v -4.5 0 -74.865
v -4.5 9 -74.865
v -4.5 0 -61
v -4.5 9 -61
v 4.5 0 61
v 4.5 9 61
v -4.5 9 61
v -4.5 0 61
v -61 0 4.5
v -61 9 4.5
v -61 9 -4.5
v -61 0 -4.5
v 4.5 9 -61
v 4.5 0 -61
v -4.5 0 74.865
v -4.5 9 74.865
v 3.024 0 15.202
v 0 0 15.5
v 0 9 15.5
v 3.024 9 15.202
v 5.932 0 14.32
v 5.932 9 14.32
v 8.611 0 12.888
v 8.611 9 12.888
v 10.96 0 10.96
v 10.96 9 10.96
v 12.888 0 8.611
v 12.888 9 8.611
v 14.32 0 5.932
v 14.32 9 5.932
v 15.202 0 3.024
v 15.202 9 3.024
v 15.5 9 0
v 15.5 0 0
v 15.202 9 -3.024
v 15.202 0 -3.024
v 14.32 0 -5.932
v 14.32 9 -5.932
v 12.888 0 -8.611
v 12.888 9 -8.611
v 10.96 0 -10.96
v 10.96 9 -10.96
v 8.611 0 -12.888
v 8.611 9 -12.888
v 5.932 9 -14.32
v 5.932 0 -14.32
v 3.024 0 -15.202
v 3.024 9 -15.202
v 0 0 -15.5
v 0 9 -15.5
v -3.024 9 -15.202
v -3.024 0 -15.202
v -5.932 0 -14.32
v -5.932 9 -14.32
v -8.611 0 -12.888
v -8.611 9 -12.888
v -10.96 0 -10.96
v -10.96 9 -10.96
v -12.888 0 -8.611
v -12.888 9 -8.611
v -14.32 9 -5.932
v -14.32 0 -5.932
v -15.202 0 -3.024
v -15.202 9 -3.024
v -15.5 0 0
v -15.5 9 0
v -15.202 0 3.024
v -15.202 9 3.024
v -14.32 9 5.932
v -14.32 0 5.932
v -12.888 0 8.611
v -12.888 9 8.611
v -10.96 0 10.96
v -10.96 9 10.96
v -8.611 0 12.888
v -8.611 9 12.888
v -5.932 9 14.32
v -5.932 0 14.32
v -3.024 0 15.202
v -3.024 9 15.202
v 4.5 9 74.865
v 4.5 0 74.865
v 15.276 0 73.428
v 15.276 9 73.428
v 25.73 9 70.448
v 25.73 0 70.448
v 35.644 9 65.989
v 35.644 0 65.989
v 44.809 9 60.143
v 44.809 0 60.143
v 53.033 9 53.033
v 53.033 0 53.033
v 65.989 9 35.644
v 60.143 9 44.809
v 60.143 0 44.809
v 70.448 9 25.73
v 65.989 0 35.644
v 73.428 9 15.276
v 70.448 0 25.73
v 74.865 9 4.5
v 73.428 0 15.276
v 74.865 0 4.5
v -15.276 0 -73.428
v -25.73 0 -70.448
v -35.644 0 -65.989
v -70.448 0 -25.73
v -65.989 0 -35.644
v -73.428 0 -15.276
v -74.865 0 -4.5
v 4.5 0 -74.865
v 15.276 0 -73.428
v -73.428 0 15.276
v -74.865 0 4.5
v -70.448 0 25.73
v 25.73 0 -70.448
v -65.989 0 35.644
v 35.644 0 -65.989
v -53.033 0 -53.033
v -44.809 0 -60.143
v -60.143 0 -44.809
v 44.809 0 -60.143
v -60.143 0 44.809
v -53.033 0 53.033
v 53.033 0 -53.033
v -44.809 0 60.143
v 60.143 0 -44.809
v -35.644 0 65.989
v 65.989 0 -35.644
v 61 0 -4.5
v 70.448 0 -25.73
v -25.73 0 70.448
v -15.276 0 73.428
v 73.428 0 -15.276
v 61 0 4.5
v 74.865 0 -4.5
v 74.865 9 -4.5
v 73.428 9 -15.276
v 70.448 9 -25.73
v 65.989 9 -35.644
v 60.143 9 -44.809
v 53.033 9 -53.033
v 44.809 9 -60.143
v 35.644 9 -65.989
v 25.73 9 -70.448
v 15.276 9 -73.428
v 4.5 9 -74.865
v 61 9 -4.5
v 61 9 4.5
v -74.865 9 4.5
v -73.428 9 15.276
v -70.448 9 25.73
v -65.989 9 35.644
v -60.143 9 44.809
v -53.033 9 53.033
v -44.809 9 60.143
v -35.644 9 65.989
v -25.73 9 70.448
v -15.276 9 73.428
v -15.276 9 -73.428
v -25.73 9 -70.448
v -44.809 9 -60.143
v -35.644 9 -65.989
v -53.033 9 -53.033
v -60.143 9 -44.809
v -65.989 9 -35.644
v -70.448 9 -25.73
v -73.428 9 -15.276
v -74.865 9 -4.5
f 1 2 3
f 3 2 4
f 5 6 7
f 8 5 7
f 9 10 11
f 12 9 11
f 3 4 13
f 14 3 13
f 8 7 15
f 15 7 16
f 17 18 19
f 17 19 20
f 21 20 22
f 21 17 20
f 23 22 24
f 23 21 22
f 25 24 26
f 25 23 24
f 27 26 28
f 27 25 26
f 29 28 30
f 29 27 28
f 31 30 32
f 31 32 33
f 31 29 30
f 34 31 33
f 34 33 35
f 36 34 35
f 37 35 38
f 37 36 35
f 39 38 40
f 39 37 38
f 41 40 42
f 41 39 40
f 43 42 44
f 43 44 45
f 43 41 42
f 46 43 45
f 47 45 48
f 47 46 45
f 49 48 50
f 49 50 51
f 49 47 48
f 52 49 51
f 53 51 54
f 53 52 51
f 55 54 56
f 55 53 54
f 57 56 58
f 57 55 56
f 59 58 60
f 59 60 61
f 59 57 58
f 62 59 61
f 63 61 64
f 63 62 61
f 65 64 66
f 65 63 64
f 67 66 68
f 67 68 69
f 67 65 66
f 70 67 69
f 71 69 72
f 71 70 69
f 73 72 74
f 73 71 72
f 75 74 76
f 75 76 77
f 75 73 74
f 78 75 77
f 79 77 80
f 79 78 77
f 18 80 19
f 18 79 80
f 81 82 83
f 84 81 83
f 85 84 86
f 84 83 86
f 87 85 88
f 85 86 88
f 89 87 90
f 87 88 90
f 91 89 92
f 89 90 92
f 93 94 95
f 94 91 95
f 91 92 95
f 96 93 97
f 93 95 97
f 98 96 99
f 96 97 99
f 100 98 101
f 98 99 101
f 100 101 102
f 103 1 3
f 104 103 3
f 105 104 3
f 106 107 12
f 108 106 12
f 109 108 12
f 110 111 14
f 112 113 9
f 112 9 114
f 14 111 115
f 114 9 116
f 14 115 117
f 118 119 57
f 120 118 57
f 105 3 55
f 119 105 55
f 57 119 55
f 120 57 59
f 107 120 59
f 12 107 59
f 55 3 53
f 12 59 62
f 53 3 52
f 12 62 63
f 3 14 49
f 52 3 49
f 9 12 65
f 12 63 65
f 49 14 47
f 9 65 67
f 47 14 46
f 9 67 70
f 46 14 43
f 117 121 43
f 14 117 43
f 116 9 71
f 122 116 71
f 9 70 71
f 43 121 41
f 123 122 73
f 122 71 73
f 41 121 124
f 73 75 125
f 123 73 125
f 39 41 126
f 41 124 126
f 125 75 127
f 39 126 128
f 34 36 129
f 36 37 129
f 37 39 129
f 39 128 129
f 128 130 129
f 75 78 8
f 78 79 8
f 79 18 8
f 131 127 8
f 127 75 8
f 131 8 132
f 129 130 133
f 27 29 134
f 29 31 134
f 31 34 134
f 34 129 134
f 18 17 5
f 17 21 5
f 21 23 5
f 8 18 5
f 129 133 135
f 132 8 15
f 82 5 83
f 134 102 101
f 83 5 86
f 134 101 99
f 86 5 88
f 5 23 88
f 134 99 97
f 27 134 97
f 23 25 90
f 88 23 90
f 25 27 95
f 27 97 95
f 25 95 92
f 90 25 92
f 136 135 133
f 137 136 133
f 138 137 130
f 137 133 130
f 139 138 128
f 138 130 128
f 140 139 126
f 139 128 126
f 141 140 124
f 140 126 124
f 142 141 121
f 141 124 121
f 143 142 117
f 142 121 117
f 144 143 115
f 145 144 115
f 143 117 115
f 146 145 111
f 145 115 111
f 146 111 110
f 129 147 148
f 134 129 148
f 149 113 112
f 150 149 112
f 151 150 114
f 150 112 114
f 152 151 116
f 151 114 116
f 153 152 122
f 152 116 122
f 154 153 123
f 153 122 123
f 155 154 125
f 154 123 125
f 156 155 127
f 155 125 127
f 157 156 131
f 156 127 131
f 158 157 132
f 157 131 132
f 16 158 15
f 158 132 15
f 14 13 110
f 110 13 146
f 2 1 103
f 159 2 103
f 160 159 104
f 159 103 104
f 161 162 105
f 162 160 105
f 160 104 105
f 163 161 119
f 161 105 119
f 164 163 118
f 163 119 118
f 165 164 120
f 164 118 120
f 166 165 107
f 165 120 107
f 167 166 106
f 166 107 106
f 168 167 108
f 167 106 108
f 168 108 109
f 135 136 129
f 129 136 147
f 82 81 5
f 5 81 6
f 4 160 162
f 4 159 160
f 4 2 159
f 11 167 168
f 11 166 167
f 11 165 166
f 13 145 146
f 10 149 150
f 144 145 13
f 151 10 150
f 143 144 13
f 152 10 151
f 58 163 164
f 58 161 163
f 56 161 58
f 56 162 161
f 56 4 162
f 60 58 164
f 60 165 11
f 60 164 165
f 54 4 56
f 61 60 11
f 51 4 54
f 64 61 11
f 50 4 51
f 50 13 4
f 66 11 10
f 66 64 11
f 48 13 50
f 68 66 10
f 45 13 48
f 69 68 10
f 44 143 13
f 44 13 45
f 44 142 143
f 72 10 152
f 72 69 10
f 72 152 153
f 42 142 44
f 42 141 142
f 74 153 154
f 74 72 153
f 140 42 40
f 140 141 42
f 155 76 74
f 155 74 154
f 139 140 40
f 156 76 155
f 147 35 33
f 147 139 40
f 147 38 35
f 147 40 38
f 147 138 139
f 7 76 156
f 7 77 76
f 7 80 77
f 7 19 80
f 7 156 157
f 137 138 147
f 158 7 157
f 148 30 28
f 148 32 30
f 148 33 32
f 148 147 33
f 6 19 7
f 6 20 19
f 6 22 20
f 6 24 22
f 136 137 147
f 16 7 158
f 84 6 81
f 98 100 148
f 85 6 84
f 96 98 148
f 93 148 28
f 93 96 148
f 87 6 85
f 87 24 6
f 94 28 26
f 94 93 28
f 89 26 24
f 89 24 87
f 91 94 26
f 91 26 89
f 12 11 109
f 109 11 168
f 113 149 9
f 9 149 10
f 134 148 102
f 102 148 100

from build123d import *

# Parameters (mm, degrees)
ESBO_O3_R                = 75
ESBO_O3_R_2              = 15.5
RESSALTO_EXTRUS_O2_DEPTH = 9
CORTE_EXTRUS_O1_REACH    = 11


with BuildPart() as part:
    # Esboço3 → Ressalto-extrusão2 (new body)
    with BuildSketch(Plane(origin=(0, 0, 0), x_dir=(1, 0, 0), z_dir=(0, 1, 0))):
        with Locations(Location((0, 0, 0), (0, 0, 270))):  # turned: the seam where the file's is
            Circle(ESBO_O3_R)
        with Locations(Location((0, 0, 0), (0, 0, 270))):  # turned: the seam where the file's is
            Circle(ESBO_O3_R_2, mode=Mode.SUBTRACT)
    extrude(amount=RESSALTO_EXTRUS_O2_DEPTH)

    # Esboço5 → Corte-extrusão1 (cut, up to next)
    with BuildSketch(Plane(origin=(0, 9, 0), x_dir=(1, 0, 0), z_dir=(0, 1, 0)), mode=Mode.PRIVATE) as corte_extrus_o1_sk1:
        with BuildLine():
            ThreePointArc((0, 75), (-2.251014098, 74.966211959), (-4.5, 74.864878281))
            Line((-4.5, 74.864878281), (-4.5, 61))
            Line((-4.5, 61), (4.5, 61))
            Line((4.5, 61), (4.5, 74.864878281))
            ThreePointArc((4.5, 74.864878281), (2.251014098, 74.966211959), (0, 75))
        make_face()
    corte_extrus_o1_tool1 = extrude(corte_extrus_o1_sk1.sketch, amount=-CORTE_EXTRUS_O1_REACH, mode=Mode.PRIVATE) & part.part
    add(corte_extrus_o1_tool1.solids().sort_by_distance((0, 9, -67.977546))[0], mode=Mode.SUBTRACT)
    # Esboço5 → Corte-extrusão1 (cut, up to next)
    with BuildSketch(Plane(origin=(0, 9, 0), x_dir=(1, 0, 0), z_dir=(0, 1, 0)), mode=Mode.PRIVATE) as corte_extrus_o1_sk2:
        with BuildLine():
            Line((61, -4.5), (74.864878281, -4.5))
            ThreePointArc((74.864878281, -4.5), (74.966211959, -2.251014098), (75, 0))
            ThreePointArc((75, 0), (74.966211959, 2.251014098), (74.864878281, 4.5))
            Line((74.864878281, 4.5), (61, 4.5))
            Line((61, 4.5), (61, -4.5))
        make_face()
    corte_extrus_o1_tool2 = extrude(corte_extrus_o1_sk2.sketch, amount=-CORTE_EXTRUS_O1_REACH, mode=Mode.PRIVATE) & part.part
    add(corte_extrus_o1_tool2.solids().sort_by_distance((67.977546, 9, 0))[0], mode=Mode.SUBTRACT)
    # Esboço5 → Corte-extrusão1 (cut, up to next)
    with BuildSketch(Plane(origin=(0, 9, 0), x_dir=(1, 0, 0), z_dir=(0, 1, 0)), mode=Mode.PRIVATE) as corte_extrus_o1_sk3:
        with BuildLine():
            Line((-4.5, -61), (-4.5, -74.864878281))
            ThreePointArc((-4.5, -74.864878281), (-2.251014098, -74.966211959), (0, -75))
            ThreePointArc((0, -75), (2.251014098, -74.966211959), (4.5, -74.864878281))
            Line((4.5, -74.864878281), (4.5, -61))
            Line((4.5, -61), (-4.5, -61))
        make_face()
    corte_extrus_o1_tool3 = extrude(corte_extrus_o1_sk3.sketch, amount=-CORTE_EXTRUS_O1_REACH, mode=Mode.PRIVATE) & part.part
    add(corte_extrus_o1_tool3.solids().sort_by_distance((0, 9, 67.977546))[0], mode=Mode.SUBTRACT)
    # Esboço5 → Corte-extrusão1 (cut, up to next)
    with BuildSketch(Plane(origin=(0, 9, 0), x_dir=(1, 0, 0), z_dir=(0, 1, 0)), mode=Mode.PRIVATE) as corte_extrus_o1_sk4:
        with BuildLine():
            ThreePointArc((-75, 0), (-74.966211959, -2.251014098), (-74.864878281, -4.5))
            Line((-74.864878281, -4.5), (-61, -4.5))
            Line((-61, -4.5), (-61, 4.5))
            Line((-61, 4.5), (-74.864878281, 4.5))
            ThreePointArc((-74.864878281, 4.5), (-74.966211959, 2.251014098), (-75, 0))
        make_face()
    corte_extrus_o1_tool4 = extrude(corte_extrus_o1_sk4.sketch, amount=-CORTE_EXTRUS_O1_REACH, mode=Mode.PRIVATE) & part.part
    add(corte_extrus_o1_tool4.solids().sort_by_distance((-67.977546, 9, 0))[0], mode=Mode.SUBTRACT)


solid = part.part
